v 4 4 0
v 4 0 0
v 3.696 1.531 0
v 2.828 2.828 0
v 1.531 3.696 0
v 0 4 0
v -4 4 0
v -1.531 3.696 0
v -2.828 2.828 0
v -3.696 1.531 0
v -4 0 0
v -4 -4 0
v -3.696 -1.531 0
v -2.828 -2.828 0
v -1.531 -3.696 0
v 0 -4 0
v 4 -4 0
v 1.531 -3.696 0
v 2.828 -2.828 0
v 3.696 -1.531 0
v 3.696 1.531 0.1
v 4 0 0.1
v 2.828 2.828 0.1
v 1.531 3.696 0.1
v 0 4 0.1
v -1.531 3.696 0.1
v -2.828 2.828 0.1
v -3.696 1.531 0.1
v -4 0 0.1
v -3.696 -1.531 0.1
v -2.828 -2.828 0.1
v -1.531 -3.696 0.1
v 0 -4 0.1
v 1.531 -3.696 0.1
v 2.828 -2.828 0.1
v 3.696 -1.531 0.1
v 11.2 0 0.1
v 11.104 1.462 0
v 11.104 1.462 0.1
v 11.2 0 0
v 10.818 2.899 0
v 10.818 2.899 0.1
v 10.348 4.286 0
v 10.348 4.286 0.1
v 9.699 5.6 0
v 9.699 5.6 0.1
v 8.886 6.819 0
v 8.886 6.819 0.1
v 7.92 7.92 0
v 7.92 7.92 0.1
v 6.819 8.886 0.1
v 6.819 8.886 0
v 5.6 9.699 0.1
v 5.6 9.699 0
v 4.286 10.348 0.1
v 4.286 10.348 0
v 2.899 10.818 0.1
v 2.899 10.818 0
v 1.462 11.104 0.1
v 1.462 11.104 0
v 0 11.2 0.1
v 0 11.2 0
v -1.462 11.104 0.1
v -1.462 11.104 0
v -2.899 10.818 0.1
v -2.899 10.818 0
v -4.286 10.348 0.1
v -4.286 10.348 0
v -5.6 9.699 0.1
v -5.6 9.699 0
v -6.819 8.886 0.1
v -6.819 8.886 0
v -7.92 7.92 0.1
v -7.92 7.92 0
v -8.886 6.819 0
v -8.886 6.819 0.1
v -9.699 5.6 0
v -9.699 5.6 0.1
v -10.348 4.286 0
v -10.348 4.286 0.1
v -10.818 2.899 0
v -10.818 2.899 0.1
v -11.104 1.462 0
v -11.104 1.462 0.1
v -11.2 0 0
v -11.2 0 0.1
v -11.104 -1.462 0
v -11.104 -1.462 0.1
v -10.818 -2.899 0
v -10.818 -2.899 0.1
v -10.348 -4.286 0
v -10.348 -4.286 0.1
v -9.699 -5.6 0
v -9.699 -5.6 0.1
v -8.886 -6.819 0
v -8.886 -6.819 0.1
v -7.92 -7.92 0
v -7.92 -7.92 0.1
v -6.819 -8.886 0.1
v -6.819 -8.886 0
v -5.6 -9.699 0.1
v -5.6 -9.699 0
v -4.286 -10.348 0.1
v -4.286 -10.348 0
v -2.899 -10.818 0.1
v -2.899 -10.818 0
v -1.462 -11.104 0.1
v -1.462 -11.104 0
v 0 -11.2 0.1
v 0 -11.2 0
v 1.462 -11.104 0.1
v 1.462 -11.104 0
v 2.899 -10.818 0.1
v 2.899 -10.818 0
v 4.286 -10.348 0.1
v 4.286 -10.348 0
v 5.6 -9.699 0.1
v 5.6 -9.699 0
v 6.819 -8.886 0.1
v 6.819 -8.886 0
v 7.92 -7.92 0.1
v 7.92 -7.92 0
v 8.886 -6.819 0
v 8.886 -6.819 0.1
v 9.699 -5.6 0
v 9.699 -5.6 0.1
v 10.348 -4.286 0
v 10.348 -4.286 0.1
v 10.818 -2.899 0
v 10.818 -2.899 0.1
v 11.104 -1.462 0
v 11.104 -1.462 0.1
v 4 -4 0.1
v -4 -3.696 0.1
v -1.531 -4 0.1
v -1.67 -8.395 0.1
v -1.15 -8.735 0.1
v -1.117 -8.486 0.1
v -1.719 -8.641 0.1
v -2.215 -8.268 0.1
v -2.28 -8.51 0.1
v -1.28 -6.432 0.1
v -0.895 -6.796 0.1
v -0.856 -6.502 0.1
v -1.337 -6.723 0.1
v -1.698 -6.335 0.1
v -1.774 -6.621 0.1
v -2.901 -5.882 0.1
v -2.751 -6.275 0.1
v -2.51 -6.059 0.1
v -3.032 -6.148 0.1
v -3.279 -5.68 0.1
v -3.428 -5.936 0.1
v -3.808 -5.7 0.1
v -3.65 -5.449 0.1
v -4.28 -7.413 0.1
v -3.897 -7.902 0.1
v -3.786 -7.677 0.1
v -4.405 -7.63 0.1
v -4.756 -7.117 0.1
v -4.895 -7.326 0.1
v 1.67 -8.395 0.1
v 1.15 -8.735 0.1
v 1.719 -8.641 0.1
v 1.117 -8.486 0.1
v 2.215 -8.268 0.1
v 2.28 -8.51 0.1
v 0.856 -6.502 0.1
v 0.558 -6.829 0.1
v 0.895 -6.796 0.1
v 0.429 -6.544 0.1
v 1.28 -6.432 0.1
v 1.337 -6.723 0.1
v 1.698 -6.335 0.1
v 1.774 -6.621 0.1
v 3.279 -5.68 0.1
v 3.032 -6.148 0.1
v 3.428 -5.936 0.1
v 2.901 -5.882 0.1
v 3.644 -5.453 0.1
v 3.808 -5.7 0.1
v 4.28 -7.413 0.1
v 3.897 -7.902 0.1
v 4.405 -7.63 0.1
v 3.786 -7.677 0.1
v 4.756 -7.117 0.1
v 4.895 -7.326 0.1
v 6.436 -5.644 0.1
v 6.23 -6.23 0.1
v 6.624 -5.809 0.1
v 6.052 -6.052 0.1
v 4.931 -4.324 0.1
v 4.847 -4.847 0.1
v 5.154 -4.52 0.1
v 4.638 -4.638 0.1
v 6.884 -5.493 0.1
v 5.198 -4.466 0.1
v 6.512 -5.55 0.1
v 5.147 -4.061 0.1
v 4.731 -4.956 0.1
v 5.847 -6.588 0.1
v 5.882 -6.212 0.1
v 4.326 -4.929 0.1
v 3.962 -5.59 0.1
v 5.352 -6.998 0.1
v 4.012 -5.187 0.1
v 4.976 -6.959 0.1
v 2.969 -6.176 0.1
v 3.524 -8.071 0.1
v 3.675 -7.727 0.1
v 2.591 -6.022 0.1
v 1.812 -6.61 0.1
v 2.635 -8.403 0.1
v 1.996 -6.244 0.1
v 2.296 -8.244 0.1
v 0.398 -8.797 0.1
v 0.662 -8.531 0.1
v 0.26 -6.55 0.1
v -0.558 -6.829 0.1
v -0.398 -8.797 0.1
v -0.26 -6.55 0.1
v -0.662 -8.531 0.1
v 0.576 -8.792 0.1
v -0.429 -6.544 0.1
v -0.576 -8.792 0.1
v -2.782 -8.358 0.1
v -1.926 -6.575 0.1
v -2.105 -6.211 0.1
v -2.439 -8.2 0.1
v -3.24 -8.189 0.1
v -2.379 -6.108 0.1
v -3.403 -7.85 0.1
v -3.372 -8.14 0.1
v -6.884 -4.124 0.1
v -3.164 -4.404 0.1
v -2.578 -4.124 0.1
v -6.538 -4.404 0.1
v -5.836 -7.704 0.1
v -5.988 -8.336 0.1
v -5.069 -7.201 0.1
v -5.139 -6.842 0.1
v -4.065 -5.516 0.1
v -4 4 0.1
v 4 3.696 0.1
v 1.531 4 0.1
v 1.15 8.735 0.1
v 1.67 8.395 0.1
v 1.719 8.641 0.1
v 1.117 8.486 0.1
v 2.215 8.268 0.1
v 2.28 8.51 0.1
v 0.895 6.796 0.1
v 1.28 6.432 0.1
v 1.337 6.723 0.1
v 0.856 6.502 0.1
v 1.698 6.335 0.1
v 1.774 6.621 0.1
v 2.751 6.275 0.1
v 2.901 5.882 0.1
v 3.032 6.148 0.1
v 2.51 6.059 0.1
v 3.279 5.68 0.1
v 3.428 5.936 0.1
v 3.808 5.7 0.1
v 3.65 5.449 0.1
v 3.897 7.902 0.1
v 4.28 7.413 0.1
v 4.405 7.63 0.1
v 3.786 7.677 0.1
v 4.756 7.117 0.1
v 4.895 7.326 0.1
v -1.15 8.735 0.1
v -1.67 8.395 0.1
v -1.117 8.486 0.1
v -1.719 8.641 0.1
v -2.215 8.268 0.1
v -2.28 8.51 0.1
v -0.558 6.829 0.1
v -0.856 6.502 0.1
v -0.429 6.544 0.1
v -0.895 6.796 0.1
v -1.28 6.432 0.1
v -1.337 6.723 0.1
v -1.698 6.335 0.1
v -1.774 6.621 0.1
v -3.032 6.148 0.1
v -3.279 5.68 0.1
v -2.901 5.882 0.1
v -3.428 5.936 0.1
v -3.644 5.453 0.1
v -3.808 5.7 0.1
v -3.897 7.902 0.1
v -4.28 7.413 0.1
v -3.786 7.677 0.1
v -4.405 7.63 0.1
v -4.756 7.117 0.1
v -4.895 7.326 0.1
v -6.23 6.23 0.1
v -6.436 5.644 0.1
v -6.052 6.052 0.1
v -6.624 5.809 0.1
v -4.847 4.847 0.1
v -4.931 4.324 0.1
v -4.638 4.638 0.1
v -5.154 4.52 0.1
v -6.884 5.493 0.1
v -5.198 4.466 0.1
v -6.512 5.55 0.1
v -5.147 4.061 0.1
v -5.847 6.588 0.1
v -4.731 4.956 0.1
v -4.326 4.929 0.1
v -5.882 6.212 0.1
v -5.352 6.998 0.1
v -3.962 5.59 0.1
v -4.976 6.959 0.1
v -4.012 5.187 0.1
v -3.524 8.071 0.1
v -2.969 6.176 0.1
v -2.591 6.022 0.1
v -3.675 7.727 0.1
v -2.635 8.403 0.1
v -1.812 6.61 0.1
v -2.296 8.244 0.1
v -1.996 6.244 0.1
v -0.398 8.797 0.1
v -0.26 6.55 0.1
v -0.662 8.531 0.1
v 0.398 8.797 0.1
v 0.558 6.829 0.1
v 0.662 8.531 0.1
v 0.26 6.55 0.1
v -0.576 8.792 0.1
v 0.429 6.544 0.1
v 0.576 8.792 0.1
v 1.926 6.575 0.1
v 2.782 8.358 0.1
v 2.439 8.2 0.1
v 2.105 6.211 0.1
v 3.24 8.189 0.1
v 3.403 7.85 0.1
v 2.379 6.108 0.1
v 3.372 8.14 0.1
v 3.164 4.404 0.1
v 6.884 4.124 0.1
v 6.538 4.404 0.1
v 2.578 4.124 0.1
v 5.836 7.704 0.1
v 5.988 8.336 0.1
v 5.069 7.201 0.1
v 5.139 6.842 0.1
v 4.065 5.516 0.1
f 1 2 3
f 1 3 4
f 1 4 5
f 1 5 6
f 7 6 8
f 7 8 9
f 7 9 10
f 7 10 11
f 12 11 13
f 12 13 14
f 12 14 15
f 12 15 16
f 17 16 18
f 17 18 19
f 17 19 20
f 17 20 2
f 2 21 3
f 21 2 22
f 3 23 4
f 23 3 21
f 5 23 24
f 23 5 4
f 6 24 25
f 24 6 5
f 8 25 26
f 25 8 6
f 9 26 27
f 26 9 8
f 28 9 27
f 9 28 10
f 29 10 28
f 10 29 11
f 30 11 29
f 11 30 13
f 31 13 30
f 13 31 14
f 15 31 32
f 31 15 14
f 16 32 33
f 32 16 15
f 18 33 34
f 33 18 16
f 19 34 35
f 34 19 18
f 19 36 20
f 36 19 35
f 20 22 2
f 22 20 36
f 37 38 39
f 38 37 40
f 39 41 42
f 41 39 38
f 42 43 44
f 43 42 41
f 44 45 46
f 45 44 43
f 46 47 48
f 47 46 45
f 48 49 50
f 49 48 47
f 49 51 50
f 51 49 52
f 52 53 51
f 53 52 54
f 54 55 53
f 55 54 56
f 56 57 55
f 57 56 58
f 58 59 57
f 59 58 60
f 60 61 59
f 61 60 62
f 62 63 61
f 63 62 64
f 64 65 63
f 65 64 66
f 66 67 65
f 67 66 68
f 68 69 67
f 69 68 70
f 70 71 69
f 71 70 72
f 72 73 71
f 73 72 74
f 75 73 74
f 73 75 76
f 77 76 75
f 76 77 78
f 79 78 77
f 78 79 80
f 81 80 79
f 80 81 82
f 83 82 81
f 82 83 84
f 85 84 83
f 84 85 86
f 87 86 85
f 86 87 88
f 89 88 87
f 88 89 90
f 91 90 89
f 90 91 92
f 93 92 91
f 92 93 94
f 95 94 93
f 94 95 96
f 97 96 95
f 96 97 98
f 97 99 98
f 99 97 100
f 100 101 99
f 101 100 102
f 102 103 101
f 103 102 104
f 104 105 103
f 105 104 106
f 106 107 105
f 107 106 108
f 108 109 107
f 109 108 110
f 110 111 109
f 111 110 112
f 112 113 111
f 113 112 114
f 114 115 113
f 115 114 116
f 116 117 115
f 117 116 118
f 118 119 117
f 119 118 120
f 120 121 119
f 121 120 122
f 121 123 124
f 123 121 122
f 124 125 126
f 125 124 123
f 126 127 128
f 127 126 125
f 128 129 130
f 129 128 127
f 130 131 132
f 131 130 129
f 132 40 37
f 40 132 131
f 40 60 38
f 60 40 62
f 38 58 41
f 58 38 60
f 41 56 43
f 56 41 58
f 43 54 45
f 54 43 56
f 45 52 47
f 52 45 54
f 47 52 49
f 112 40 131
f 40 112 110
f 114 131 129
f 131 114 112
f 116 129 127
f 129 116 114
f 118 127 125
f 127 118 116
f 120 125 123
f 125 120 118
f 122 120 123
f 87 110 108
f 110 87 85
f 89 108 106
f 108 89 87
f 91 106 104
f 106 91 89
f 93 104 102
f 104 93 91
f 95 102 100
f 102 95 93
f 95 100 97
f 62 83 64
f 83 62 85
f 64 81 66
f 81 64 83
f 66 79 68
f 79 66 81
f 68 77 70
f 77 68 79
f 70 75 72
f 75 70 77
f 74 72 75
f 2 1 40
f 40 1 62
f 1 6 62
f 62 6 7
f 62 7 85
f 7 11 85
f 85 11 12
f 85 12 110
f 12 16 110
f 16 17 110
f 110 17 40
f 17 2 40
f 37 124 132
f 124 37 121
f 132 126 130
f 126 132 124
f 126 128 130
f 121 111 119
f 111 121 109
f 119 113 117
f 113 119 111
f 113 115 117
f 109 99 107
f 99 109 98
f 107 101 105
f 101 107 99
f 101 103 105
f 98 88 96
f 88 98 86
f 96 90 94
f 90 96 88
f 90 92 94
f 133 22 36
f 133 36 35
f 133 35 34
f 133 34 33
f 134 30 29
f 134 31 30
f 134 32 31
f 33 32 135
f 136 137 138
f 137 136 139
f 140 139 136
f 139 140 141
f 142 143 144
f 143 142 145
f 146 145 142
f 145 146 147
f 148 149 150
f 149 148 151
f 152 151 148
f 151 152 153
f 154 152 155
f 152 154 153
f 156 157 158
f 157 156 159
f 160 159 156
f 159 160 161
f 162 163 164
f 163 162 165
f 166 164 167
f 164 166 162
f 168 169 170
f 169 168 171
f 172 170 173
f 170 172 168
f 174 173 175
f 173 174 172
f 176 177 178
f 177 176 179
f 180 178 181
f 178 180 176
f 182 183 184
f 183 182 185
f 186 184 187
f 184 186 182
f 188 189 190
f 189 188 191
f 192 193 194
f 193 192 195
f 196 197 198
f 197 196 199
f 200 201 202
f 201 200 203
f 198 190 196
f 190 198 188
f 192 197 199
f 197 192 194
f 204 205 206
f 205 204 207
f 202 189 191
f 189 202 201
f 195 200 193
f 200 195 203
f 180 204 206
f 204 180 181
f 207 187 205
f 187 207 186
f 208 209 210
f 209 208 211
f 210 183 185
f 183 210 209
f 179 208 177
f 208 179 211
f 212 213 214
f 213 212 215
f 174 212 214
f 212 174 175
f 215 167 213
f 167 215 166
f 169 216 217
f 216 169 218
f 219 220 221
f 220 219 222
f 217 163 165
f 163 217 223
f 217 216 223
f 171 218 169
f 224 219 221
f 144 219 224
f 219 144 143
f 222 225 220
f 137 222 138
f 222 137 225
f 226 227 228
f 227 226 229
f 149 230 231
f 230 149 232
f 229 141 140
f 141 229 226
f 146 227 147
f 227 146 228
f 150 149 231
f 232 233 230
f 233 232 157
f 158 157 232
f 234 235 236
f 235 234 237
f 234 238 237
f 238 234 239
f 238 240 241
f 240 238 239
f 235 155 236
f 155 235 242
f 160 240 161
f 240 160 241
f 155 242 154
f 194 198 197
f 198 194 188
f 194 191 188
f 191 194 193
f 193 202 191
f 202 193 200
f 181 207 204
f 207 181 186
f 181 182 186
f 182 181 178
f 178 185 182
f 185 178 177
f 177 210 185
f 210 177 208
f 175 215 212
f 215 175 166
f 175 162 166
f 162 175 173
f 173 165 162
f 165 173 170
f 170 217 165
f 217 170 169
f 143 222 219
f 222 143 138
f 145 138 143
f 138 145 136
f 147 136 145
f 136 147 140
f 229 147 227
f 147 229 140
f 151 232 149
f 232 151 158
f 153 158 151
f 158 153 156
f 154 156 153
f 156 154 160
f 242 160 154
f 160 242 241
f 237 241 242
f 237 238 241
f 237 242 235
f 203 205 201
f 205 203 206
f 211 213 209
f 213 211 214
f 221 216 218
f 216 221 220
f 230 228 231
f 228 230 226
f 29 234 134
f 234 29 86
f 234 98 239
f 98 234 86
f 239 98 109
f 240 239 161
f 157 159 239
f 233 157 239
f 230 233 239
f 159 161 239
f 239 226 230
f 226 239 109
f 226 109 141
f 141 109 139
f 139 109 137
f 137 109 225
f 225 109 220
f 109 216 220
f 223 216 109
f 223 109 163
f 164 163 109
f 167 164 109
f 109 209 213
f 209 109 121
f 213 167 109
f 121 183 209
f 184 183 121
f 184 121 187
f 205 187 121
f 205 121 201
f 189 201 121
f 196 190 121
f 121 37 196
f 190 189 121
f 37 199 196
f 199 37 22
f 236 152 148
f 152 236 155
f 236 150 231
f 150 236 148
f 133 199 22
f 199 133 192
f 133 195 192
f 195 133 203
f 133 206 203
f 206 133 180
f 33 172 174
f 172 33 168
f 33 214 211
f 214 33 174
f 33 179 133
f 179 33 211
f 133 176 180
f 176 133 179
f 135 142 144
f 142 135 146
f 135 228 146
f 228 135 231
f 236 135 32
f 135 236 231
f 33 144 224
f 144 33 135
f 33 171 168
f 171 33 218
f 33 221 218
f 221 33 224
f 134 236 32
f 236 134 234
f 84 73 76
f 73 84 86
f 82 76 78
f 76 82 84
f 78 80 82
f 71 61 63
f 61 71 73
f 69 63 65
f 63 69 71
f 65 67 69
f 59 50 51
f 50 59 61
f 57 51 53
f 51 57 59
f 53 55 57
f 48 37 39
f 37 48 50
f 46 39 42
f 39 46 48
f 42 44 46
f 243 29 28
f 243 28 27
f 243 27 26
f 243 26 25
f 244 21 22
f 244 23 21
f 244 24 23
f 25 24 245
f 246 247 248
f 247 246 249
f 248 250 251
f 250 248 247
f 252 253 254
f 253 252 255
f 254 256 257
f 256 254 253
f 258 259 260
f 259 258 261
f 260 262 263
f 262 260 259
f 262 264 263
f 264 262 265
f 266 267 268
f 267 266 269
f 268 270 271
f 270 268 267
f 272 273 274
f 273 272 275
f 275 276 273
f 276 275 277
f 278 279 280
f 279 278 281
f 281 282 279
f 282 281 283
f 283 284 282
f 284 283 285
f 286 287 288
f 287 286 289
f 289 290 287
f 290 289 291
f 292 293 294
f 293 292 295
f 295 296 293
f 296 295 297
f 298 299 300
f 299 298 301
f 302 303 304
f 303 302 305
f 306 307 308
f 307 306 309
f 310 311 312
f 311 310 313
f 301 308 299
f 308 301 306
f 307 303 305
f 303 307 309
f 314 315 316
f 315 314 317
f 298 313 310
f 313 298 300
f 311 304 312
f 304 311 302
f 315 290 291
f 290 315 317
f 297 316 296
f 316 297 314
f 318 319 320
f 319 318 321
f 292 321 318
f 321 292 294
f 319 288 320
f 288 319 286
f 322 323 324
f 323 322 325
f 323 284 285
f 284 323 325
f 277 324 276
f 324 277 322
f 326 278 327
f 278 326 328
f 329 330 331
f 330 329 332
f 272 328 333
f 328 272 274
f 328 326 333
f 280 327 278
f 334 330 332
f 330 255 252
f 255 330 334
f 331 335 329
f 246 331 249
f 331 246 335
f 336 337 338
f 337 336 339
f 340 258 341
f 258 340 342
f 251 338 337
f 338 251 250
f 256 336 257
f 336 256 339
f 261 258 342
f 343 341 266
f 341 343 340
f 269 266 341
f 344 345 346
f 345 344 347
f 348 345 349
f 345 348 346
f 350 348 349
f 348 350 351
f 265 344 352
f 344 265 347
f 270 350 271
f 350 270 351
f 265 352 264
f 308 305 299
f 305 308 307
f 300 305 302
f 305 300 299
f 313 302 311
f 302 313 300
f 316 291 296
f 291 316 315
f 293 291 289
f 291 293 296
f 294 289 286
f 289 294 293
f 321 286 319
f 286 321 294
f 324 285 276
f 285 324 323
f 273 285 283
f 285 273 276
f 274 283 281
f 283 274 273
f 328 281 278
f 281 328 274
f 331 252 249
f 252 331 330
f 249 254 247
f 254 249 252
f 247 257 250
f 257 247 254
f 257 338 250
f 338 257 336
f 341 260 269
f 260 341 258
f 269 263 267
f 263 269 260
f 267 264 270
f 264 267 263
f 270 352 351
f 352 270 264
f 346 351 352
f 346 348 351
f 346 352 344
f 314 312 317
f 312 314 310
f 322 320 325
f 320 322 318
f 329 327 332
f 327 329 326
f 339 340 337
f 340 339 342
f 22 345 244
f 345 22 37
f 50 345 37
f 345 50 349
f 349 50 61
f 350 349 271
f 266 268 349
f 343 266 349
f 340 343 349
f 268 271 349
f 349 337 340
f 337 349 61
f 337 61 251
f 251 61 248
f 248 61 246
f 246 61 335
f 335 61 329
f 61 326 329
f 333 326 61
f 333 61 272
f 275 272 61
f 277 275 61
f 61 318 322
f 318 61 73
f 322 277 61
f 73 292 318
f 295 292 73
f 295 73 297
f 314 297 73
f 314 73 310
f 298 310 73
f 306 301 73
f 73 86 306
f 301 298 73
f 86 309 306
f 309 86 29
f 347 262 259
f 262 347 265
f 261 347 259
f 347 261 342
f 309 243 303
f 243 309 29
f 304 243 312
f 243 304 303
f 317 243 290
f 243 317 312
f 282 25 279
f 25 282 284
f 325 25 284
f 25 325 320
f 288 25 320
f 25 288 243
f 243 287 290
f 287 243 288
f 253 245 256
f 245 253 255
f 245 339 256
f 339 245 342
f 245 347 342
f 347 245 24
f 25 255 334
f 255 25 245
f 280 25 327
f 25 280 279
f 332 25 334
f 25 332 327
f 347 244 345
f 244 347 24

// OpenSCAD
// file: ../p/48/1-4cyli.scad
use <../../lib.scad>
function ldraw_lib__48__1_4cyli() = [
// 0 Hi-Res Cylinder 0.25
// 0 Name: 48\1-4cyli.dat
// 0 Author: Magnus Forsberg [MagFors]
// 0 !LDRAW_ORG 48_Primitive UPDATE 2024-01
// 0 !LICENSE Licensed under CC BY 4.0 : see CAreadme.txt
// 
// 0 BFC CERTIFY CCW
  [0,"BFC","CERTIFY"],
  [0,"BFC","CCW"],
// 
// 0 !HISTORY 1999-07-05 [PTadmin] Official Update 1999-05
// 0 !HISTORY 2002-02-28 [hafhead] Added BFC statement
// 0 !HISTORY 2002-04-25 [PTadmin] Official Update 2002-02
// 0 !HISTORY 2007-06-24 [PTadmin] Header formatted for Contributor Agreement
// 0 !HISTORY 2008-07-01 [PTadmin] Official Update 2008-01
// 0 !HISTORY 2008-07-07 [guyvivan] Made BFC'ed CCW (2005-12-06)
// 0 !HISTORY 2009-05-02 [PTadmin] Official Update 2009-01
// 0 !HISTORY 2024-01-03 [MagFors] Complete regeneration, original by Manfred Moolhuysen
// 0 !HISTORY 2024-01-29 [OrionP] Official Update 2024-01
// 
// 4 16 0.9914 0 0.1305 1 0 0 1 1 0 0.9914 1 0.1305
  [4,16,0.9914,0,0.1305,1,0,0,1,1,0,0.9914,1,0.1305],
// 4 16 0.9659 0 0.2588 0.9914 0 0.1305 0.9914 1 0.1305 0.9659 1 0.2588
  [4,16,0.9659,0,0.2588,0.9914,0,0.1305,0.9914,1,0.1305,0.9659,1,0.2588],
// 4 16 0.9239 0 0.3827 0.9659 0 0.2588 0.9659 1 0.2588 0.9239 1 0.3827
  [4,16,0.9239,0,0.3827,0.9659,0,0.2588,0.9659,1,0.2588,0.9239,1,0.3827],
// 4 16 0.866 0 0.5 0.9239 0 0.3827 0.9239 1 0.3827 0.866 1 0.5
  [4,16,0.866,0,0.5,0.9239,0,0.3827,0.9239,1,0.3827,0.866,1,0.5],
// 4 16 0.7934 0 0.6088 0.866 0 0.5 0.866 1 0.5 0.7934 1 0.6088
  [4,16,0.7934,0,0.6088,0.866,0,0.5,0.866,1,0.5,0.7934,1,0.6088],
// 4 16 0.7071 0 0.7071 0.7934 0 0.6088 0.7934 1 0.6088 0.7071 1 0.7071
  [4,16,0.7071,0,0.7071,0.7934,0,0.6088,0.7934,1,0.6088,0.7071,1,0.7071],
// 4 16 0.6088 0 0.7934 0.7071 0 0.7071 0.7071 1 0.7071 0.6088 1 0.7934
  [4,16,0.6088,0,0.7934,0.7071,0,0.7071,0.7071,1,0.7071,0.6088,1,0.7934],
// 4 16 0.5 0 0.866 0.6088 0 0.7934 0.6088 1 0.7934 0.5 1 0.866
  [4,16,0.5,0,0.866,0.6088,0,0.7934,0.6088,1,0.7934,0.5,1,0.866],
// 4 16 0.3827 0 0.9239 0.5 0 0.866 0.5 1 0.866 0.3827 1 0.9239
  [4,16,0.3827,0,0.9239,0.5,0,0.866,0.5,1,0.866,0.3827,1,0.9239],
// 4 16 0.2588 0 0.9659 0.3827 0 0.9239 0.3827 1 0.9239 0.2588 1 0.9659
  [4,16,0.2588,0,0.9659,0.3827,0,0.9239,0.3827,1,0.9239,0.2588,1,0.9659],
// 4 16 0.1305 0 0.9914 0.2588 0 0.9659 0.2588 1 0.9659 0.1305 1 0.9914
  [4,16,0.1305,0,0.9914,0.2588,0,0.9659,0.2588,1,0.9659,0.1305,1,0.9914],
// 4 16 0 0 1 0.1305 0 0.9914 0.1305 1 0.9914 0 1 1
  [4,16,0,0,1,0.1305,0,0.9914,0.1305,1,0.9914,0,1,1],
// 0 // conditional lines
// 5 24 1 1 0 1 0 0 1 1 -0.1317 0.9914 1 0.1305
  [5,24,1,1,0,1,0,0,1,1,-0.1317,0.9914,1,0.1305],
// 5 24 0.9914 1 0.1305 0.9914 0 0.1305 1 1 0 0.9659 1 0.2588
  [5,24,0.9914,1,0.1305,0.9914,0,0.1305,1,1,0,0.9659,1,0.2588],
// 5 24 0.9659 1 0.2588 0.9659 0 0.2588 0.9914 1 0.1305 0.9239 1 0.3827
  [5,24,0.9659,1,0.2588,0.9659,0,0.2588,0.9914,1,0.1305,0.9239,1,0.3827],
// 5 24 0.9239 1 0.3827 0.9239 0 0.3827 0.9659 1 0.2588 0.866 1 0.5
  [5,24,0.9239,1,0.3827,0.9239,0,0.3827,0.9659,1,0.2588,0.866,1,0.5],
// 5 24 0.866 1 0.5 0.866 0 0.5 0.9239 1 0.3827 0.7934 1 0.6088
  [5,24,0.866,1,0.5,0.866,0,0.5,0.9239,1,0.3827,0.7934,1,0.6088],
// 5 24 0.7934 1 0.6088 0.7934 0 0.6088 0.866 1 0.5 0.7071 1 0.7071
  [5,24,0.7934,1,0.6088,0.7934,0,0.6088,0.866,1,0.5,0.7071,1,0.7071],
// 5 24 0.7071 1 0.7071 0.7071 0 0.7071 0.7934 1 0.6088 0.6088 1 0.7934
  [5,24,0.7071,1,0.7071,0.7071,0,0.7071,0.7934,1,0.6088,0.6088,1,0.7934],
// 5 24 0.6088 1 0.7934 0.6088 0 0.7934 0.7071 1 0.7071 0.5 1 0.866
  [5,24,0.6088,1,0.7934,0.6088,0,0.7934,0.7071,1,0.7071,0.5,1,0.866],
// 5 24 0.5 1 0.866 0.5 0 0.866 0.6088 1 0.7934 0.3827 1 0.9239
  [5,24,0.5,1,0.866,0.5,0,0.866,0.6088,1,0.7934,0.3827,1,0.9239],
// 5 24 0.3827 1 0.9239 0.3827 0 0.9239 0.5 1 0.866 0.2588 1 0.9659
  [5,24,0.3827,1,0.9239,0.3827,0,0.9239,0.5,1,0.866,0.2588,1,0.9659],
// 5 24 0.2588 1 0.9659 0.2588 0 0.9659 0.3827 1 0.9239 0.1305 1 0.9914
  [5,24,0.2588,1,0.9659,0.2588,0,0.9659,0.3827,1,0.9239,0.1305,1,0.9914],
// 5 24 0.1305 1 0.9914 0.1305 0 0.9914 0.2588 1 0.9659 0 1 1
  [5,24,0.1305,1,0.9914,0.1305,0,0.9914,0.2588,1,0.9659,0,1,1],
// 5 24 0 1 1 0 0 1 0.1305 1 0.9914 -0.1317 1 1
  [5,24,0,1,1,0,0,1,0.1305,1,0.9914,-0.1317,1,1],
// 0 // Build by LDPartEditor (PrimGen 2.X)
];
module ldraw_lib__48__1_4cyli(step=0, col=false, unit=2/5, alt=false, line=0.2, solid=!$preview)
    makepoly(ldraw_lib__48__1_4cyli(), step=step, col=col, unit=unit, alt=alt, line=line, solid=solid);
ldraw_lib__48__1_4cyli(line=0.2);
// file: ../p/48/4-4cyli.scad
use <../../lib.scad>
use <1-4cyli.scad>
function ldraw_lib__48__4_4cyli() = [
// 0 Hi-Res Cylinder 1.0
// 0 Name: 48\4-4cyli.dat
// 0 Author: Paul Easter [pneaster]
// 0 !LDRAW_ORG 48_Primitive UPDATE 2012-02
// 0 !LICENSE Licensed under CC BY 4.0 : see CAreadme.txt
// 
// 0 BFC CERTIFY CCW
  [0,"BFC","CERTIFY"],
  [0,"BFC","CCW"],
// 
// 0 !HISTORY 2002-08-18 [PTadmin] Official Update 2002-04
// 0 !HISTORY 2007-06-24 [PTadmin] Header formatted for Contributor Agreement
// 0 !HISTORY 2008-07-01 [PTadmin] Official Update 2008-01
// 0 !HISTORY 2012-02-27 [Philo] Changed to CCW
// 0 !HISTORY 2012-08-09 [PTadmin] Official Update 2012-02
// 
// 
// 1 16 0 0 0 1 0 0 0 1 0 0 0 1 48\1-4cyli.dat
  [1,16,0,0,0,1,0,0,0,1,0,0,0,1, ldraw_lib__48__1_4cyli()],
// 1 16 0 0 0 0 0 -1 0 1 0 1 0 0 48\1-4cyli.dat
  [1,16,0,0,0,0,0,-1,0,1,0,1,0,0, ldraw_lib__48__1_4cyli()],
// 1 16 0 0 0 -1 0 0 0 1 0 0 0 -1 48\1-4cyli.dat
  [1,16,0,0,0,-1,0,0,0,1,0,0,0,-1, ldraw_lib__48__1_4cyli()],
// 1 16 0 0 0 0 0 1 0 1 0 -1 0 0 48\1-4cyli.dat
  [1,16,0,0,0,0,0,1,0,1,0,-1,0,0, ldraw_lib__48__1_4cyli()],
];
module ldraw_lib__48__4_4cyli(step=0, col=false, unit=2/5, alt=false, line=0.2, solid=!$preview)
    makepoly(ldraw_lib__48__4_4cyli(), step=step, col=col, unit=unit, alt=alt, line=line, solid=solid);
ldraw_lib__48__4_4cyli(line=0.2);
// file: ../p/48/1-4chrd.scad
use <../../lib.scad>
function ldraw_lib__48__1_4chrd() = [
// 0 Hi-Res Chord 0.25
// 0 Name: 48\1-4chrd.dat
// 0 Author: Willy Tschager [Holly-Wood]
// 0 !LDRAW_ORG 48_Primitive UPDATE 2024-01
// 0 !LICENSE Licensed under CC BY 4.0 : see CAreadme.txt
// 
// 0 BFC CERTIFY CCW
  [0,"BFC","CERTIFY"],
  [0,"BFC","CCW"],
// 
// 0 !HISTORY 2009-05-02 [PTadmin] Official Update 2009-01
// 0 !HISTORY 2012-08-02 [MMR1988] Re-creation with PrimGen2 and Rectifier
// 0 !HISTORY 2012-08-09 [PTadmin] Official Update 2012-02
// 0 !HISTORY 2024-01-04 [Holly-Wood] Complete re-write, original by westrate
// 0 !HISTORY 2024-01-29 [OrionP] Official Update 2024-01
// 
// 0 // Vertices calculated by LDPartEditor (PrimGen 2.X)
// 
// 4 16 0 0 1 1 0 0 .9914 0 .1305 .1305 0 .9914
  [4,16,0,0,1,1,0,0,.9914,0,.1305,.1305,0,.9914],
// 4 16 .1305 0 .9914 .9914 0 .1305 .9659 0 .2588 .2588 0 .9659
  [4,16,.1305,0,.9914,.9914,0,.1305,.9659,0,.2588,.2588,0,.9659],
// 4 16 .2588 0 .9659 .9659 0 .2588 .9239 0 .3827 .3827 0 .9239
  [4,16,.2588,0,.9659,.9659,0,.2588,.9239,0,.3827,.3827,0,.9239],
// 4 16 .3827 0 .9239 .9239 0 .3827 .866 0 .5 .5 0 .866
  [4,16,.3827,0,.9239,.9239,0,.3827,.866,0,.5,.5,0,.866],
// 4 16 .5 0 .866 .866 0 .5 .7934 0 .6088 .6088 0 .7934
  [4,16,.5,0,.866,.866,0,.5,.7934,0,.6088,.6088,0,.7934],
// 3 16 .6088 0 .7934 .7934 0 .6088 .7071 0 .7071
  [3,16,.6088,0,.7934,.7934,0,.6088,.7071,0,.7071],
];
module ldraw_lib__48__1_4chrd(step=0, col=false, unit=2/5, alt=false, line=0.2, solid=!$preview)
    makepoly(ldraw_lib__48__1_4chrd(), step=step, col=col, unit=unit, alt=alt, line=line, solid=solid);
ldraw_lib__48__1_4chrd(line=0.2);
// file: ../p/4-4ndis.scad
use <../lib.scad>
function ldraw_lib__4_4ndis() = [
// 0 Disc Negative 1.0
// 0 Name: 4-4ndis.dat
// 0 Author: James Jessiman
// 0 !LDRAW_ORG Primitive UPDATE 2012-01
// 0 !LICENSE Licensed under CC BY 4.0 : see CAreadme.txt
// 
// 0 BFC CERTIFY CCW
  [0,"BFC","CERTIFY"],
  [0,"BFC","CCW"],
// 
// 0 !HISTORY 2002-03-23 [sbliss] Added BFC statement; compacted code
// 0 !HISTORY 2002-04-25 [PTadmin] Official Update 2002-02
// 0 !HISTORY 2007-06-24 [PTadmin] Header formatted for Contributor Agreement
// 0 !HISTORY 2008-07-01 [PTadmin] Official Update 2008-01
// 0 !HISTORY 2012-02-16 [Philo] Changed to CCW
// 0 !HISTORY 2012-03-30 [PTadmin] Official Update 2012-01
// 
// 
// 3 16 0.9239 0 0.3827 1 0 0 1 0 1
  [3,16,0.9239,0,0.3827,1,0,0,1,0,1],
// 3 16 0.7071 0 0.7071 0.9239 0 0.3827 1 0 1
  [3,16,0.7071,0,0.7071,0.9239,0,0.3827,1,0,1],
// 3 16 0.3827 0 0.9239 0.7071 0 0.7071 1 0 1
  [3,16,0.3827,0,0.9239,0.7071,0,0.7071,1,0,1],
// 3 16 0 0 1 0.3827 0 0.9239 1 0 1
  [3,16,0,0,1,0.3827,0,0.9239,1,0,1],
// 3 16 -0.3827 0 0.9239 0 0 1 -1 0 1
  [3,16,-0.3827,0,0.9239,0,0,1,-1,0,1],
// 3 16 -0.7071 0 0.7071 -0.3827 0 0.9239 -1 0 1
  [3,16,-0.7071,0,0.7071,-0.3827,0,0.9239,-1,0,1],
// 3 16 -0.9239 0 0.3827 -0.7071 0 0.7071 -1 0 1
  [3,16,-0.9239,0,0.3827,-0.7071,0,0.7071,-1,0,1],
// 3 16 -1 0 0 -0.9239 0 0.3827 -1 0 1
  [3,16,-1,0,0,-0.9239,0,0.3827,-1,0,1],
// 3 16 -0.9239 0 -0.3827 -1 0 0 -1 0 -1
  [3,16,-0.9239,0,-0.3827,-1,0,0,-1,0,-1],
// 3 16 -0.7071 0 -0.7071 -0.9239 0 -0.3827 -1 0 -1
  [3,16,-0.7071,0,-0.7071,-0.9239,0,-0.3827,-1,0,-1],
// 3 16 -0.3827 0 -0.9239 -0.7071 0 -0.7071 -1 0 -1
  [3,16,-0.3827,0,-0.9239,-0.7071,0,-0.7071,-1,0,-1],
// 3 16 0 0 -1 -0.3827 0 -0.9239 -1 0 -1
  [3,16,0,0,-1,-0.3827,0,-0.9239,-1,0,-1],
// 3 16 0.3827 0 -0.9239 0 0 -1 1 0 -1
  [3,16,0.3827,0,-0.9239,0,0,-1,1,0,-1],
// 3 16 0.7071 0 -0.7071 0.3827 0 -0.9239 1 0 -1
  [3,16,0.7071,0,-0.7071,0.3827,0,-0.9239,1,0,-1],
// 3 16 0.9239 0 -0.3827 0.7071 0 -0.7071 1 0 -1
  [3,16,0.9239,0,-0.3827,0.7071,0,-0.7071,1,0,-1],
// 3 16 1 0 0 0.9239 0 -0.3827 1 0 -1
  [3,16,1,0,0,0.9239,0,-0.3827,1,0,-1],
];
module ldraw_lib__4_4ndis(step=0, col=false, unit=2/5, alt=false, line=0.2, solid=!$preview)
    makepoly(ldraw_lib__4_4ndis(), step=step, col=col, unit=unit, alt=alt, line=line, solid=solid);
ldraw_lib__4_4ndis(line=0.2);
// file: ../p/4-4cyli.scad
use <../lib.scad>
function ldraw_lib__4_4cyli() = [
// 0 Cylinder 1.0
// 0 Name: 4-4cyli.dat
// 0 Author: James Jessiman
// 0 !LDRAW_ORG Primitive UPDATE 2005-01
// 0 !LICENSE Licensed under CC BY 4.0 : see CAreadme.txt
// 
// 0 BFC CERTIFY CCW
  [0,"BFC","CERTIFY"],
  [0,"BFC","CCW"],
// 
// 0 !HISTORY 1998-12-15 [PTadmin] Official Update 1998-10
// 0 !HISTORY 2002-03-23 [sbliss] Added BFC statement; merged headers from files in distributions LDraw 0.27 and Complete.
// 0 !HISTORY 2002-04-25 [PTadmin] Official Update 2002-02
// 0 !HISTORY 2004-12-14 [guyvivan] BFC CCW
// 0 !HISTORY 2005-12-28 [PTadmin] Official Update 2005-01
// 0 !HISTORY 2007-06-24 [PTadmin] Header formatted for Contributor Agreement
// 0 !HISTORY 2008-07-01 [PTadmin] Official Update 2008-01
// 
// 
// 4 16 1 1 0 0.9239 1 0.3827 0.9239 0 0.3827 1 0 0
  [4,16,1,1,0,0.9239,1,0.3827,0.9239,0,0.3827,1,0,0],
// 5 24 1 0 0 1 1 0 0.9239 0 0.3827 0.9239 0 -0.3827
  [5,24,1,0,0,1,1,0,0.9239,0,0.3827,0.9239,0,-0.3827],
// 4 16 0.9239 1 0.3827 0.7071 1 0.7071 0.7071 0 0.7071 0.9239 0 0.3827
  [4,16,0.9239,1,0.3827,0.7071,1,0.7071,0.7071,0,0.7071,0.9239,0,0.3827],
// 5 24 0.9239 0 0.3827 0.9239 1 0.3827 0.7071 0 0.7071 1 0 0
  [5,24,0.9239,0,0.3827,0.9239,1,0.3827,0.7071,0,0.7071,1,0,0],
// 4 16 0.7071 1 0.7071 0.3827 1 0.9239 0.3827 0 0.9239 0.7071 0 0.7071
  [4,16,0.7071,1,0.7071,0.3827,1,0.9239,0.3827,0,0.9239,0.7071,0,0.7071],
// 5 24 0.7071 0 0.7071 0.7071 1 0.7071 0.3827 0 0.9239 0.9239 0 0.3827
  [5,24,0.7071,0,0.7071,0.7071,1,0.7071,0.3827,0,0.9239,0.9239,0,0.3827],
// 4 16 0.3827 1 0.9239 0 1 1 0 0 1 0.3827 0 0.9239
  [4,16,0.3827,1,0.9239,0,1,1,0,0,1,0.3827,0,0.9239],
// 5 24 0.3827 0 0.9239 0.3827 1 0.9239 0 0 1 0.7071 0 0.7071
  [5,24,0.3827,0,0.9239,0.3827,1,0.9239,0,0,1,0.7071,0,0.7071],
// 4 16 0 1 1 -0.3827 1 0.9239 -0.3827 0 0.9239 0 0 1
  [4,16,0,1,1,-0.3827,1,0.9239,-0.3827,0,0.9239,0,0,1],
// 5 24 0 0 1 0 1 1 -0.3827 0 0.9239 0.3827 0 0.9239
  [5,24,0,0,1,0,1,1,-0.3827,0,0.9239,0.3827,0,0.9239],
// 4 16 -0.3827 1 0.9239 -0.7071 1 0.7071 -0.7071 0 0.7071 -0.3827 0 0.9239
  [4,16,-0.3827,1,0.9239,-0.7071,1,0.7071,-0.7071,0,0.7071,-0.3827,0,0.9239],
// 5 24 -0.3827 0 0.9239 -0.3827 1 0.9239 -0.7071 0 0.7071 0 0 1
  [5,24,-0.3827,0,0.9239,-0.3827,1,0.9239,-0.7071,0,0.7071,0,0,1],
// 4 16 -0.7071 1 0.7071 -0.9239 1 0.3827 -0.9239 0 0.3827 -0.7071 0 0.7071
  [4,16,-0.7071,1,0.7071,-0.9239,1,0.3827,-0.9239,0,0.3827,-0.7071,0,0.7071],
// 5 24 -0.7071 0 0.7071 -0.7071 1 0.7071 -0.9239 0 0.3827 -0.3827 0 0.9239
  [5,24,-0.7071,0,0.7071,-0.7071,1,0.7071,-0.9239,0,0.3827,-0.3827,0,0.9239],
// 4 16 -0.9239 1 0.3827 -1 1 0 -1 0 0 -0.9239 0 0.3827
  [4,16,-0.9239,1,0.3827,-1,1,0,-1,0,0,-0.9239,0,0.3827],
// 5 24 -0.9239 0 0.3827 -0.9239 1 0.3827 -1 0 0 -0.7071 0 0.7071
  [5,24,-0.9239,0,0.3827,-0.9239,1,0.3827,-1,0,0,-0.7071,0,0.7071],
// 4 16 -1 1 0 -0.9239 1 -0.3827 -0.9239 0 -0.3827 -1 0 0
  [4,16,-1,1,0,-0.9239,1,-0.3827,-0.9239,0,-0.3827,-1,0,0],
// 5 24 -1 0 0 -1 1 0 -0.9239 0 -0.3827 -0.9239 0 0.3827
  [5,24,-1,0,0,-1,1,0,-0.9239,0,-0.3827,-0.9239,0,0.3827],
// 4 16 -0.9239 1 -0.3827 -0.7071 1 -0.7071 -0.7071 0 -0.7071 -0.9239 0 -0.3827
  [4,16,-0.9239,1,-0.3827,-0.7071,1,-0.7071,-0.7071,0,-0.7071,-0.9239,0,-0.3827],
// 5 24 -0.9239 0 -0.3827 -0.9239 1 -0.3827 -0.7071 0 -0.7071 -1 0 0
  [5,24,-0.9239,0,-0.3827,-0.9239,1,-0.3827,-0.7071,0,-0.7071,-1,0,0],
// 4 16 -0.7071 1 -0.7071 -0.3827 1 -0.9239 -0.3827 0 -0.9239 -0.7071 0 -0.7071
  [4,16,-0.7071,1,-0.7071,-0.3827,1,-0.9239,-0.3827,0,-0.9239,-0.7071,0,-0.7071],
// 5 24 -0.7071 0 -0.7071 -0.7071 1 -0.7071 -0.3827 0 -0.9239 -0.9239 0 -0.3827
  [5,24,-0.7071,0,-0.7071,-0.7071,1,-0.7071,-0.3827,0,-0.9239,-0.9239,0,-0.3827],
// 4 16 -0.3827 1 -0.9239 0 1 -1 0 0 -1 -0.3827 0 -0.9239
  [4,16,-0.3827,1,-0.9239,0,1,-1,0,0,-1,-0.3827,0,-0.9239],
// 5 24 -0.3827 0 -0.9239 -0.3827 1 -0.9239 0 0 -1 -0.7071 0 -0.7071
  [5,24,-0.3827,0,-0.9239,-0.3827,1,-0.9239,0,0,-1,-0.7071,0,-0.7071],
// 4 16 0 1 -1 0.3827 1 -0.9239 0.3827 0 -0.9239 0 0 -1
  [4,16,0,1,-1,0.3827,1,-0.9239,0.3827,0,-0.9239,0,0,-1],
// 5 24 0 0 -1 0 1 -1 0.3827 0 -0.9239 -0.3827 0 -0.9239
  [5,24,0,0,-1,0,1,-1,0.3827,0,-0.9239,-0.3827,0,-0.9239],
// 4 16 0.3827 1 -0.9239 0.7071 1 -0.7071 0.7071 0 -0.7071 0.3827 0 -0.9239
  [4,16,0.3827,1,-0.9239,0.7071,1,-0.7071,0.7071,0,-0.7071,0.3827,0,-0.9239],
// 5 24 0.3827 0 -0.9239 0.3827 1 -0.9239 0.7071 0 -0.7071 0 0 -1
  [5,24,0.3827,0,-0.9239,0.3827,1,-0.9239,0.7071,0,-0.7071,0,0,-1],
// 4 16 0.7071 1 -0.7071 0.9239 1 -0.3827 0.9239 0 -0.3827 0.7071 0 -0.7071
  [4,16,0.7071,1,-0.7071,0.9239,1,-0.3827,0.9239,0,-0.3827,0.7071,0,-0.7071],
// 5 24 0.7071 0 -0.7071 0.7071 1 -0.7071 0.9239 0 -0.3827 0.3827 0 -0.9239
  [5,24,0.7071,0,-0.7071,0.7071,1,-0.7071,0.9239,0,-0.3827,0.3827,0,-0.9239],
// 4 16 0.9239 1 -0.3827 1 1 0 1 0 0 0.9239 0 -0.3827
  [4,16,0.9239,1,-0.3827,1,1,0,1,0,0,0.9239,0,-0.3827],
// 5 24 0.9239 0 -0.3827 0.9239 1 -0.3827 1 0 0 0.7071 0 -0.7071
  [5,24,0.9239,0,-0.3827,0.9239,1,-0.3827,1,0,0,0.7071,0,-0.7071],
// 0
];
module ldraw_lib__4_4cyli(step=0, col=false, unit=2/5, alt=false, line=0.2, solid=!$preview)
    makepoly(ldraw_lib__4_4cyli(), step=step, col=col, unit=unit, alt=alt, line=line, solid=solid);
ldraw_lib__4_4cyli(line=0.2);
// file: ../p/48/1-8chrd.scad
use <../../lib.scad>
function ldraw_lib__48__1_8chrd() = [
// 0 Hi-Res Chord 0.125
// 0 Name: 48\1-8chrd.dat
// 0 Author: Willy Tschager [Holly-Wood]
// 0 !LDRAW_ORG 48_Primitive UPDATE 2024-01
// 0 !LICENSE Licensed under CC BY 4.0 : see CAreadme.txt
// 
// 0 BFC CERTIFY CCW
  [0,"BFC","CERTIFY"],
  [0,"BFC","CCW"],
// 
// 0 !HISTORY 2009-05-02 [PTadmin] Official Update 2009-01
// 0 !HISTORY 2024-01-04 [Holly-Wood] Complete re-write, original by guyvivan
// 0 !HISTORY 2024-01-29 [OrionP] Official Update 2024-01
// 
// 0 // Vertices calculated by LDPartEditor (PrimGen 2.X)
// 
// 4 16 .7071 0 .7071 1 0 0 .9914 0 .1305 .7934 0 .6088
  [4,16,.7071,0,.7071,1,0,0,.9914,0,.1305,.7934,0,.6088],
// 4 16 .7934 0 .6088 .9914 0 .1305 .9659 0 .2588 .866 0 .5
  [4,16,.7934,0,.6088,.9914,0,.1305,.9659,0,.2588,.866,0,.5],
// 3 16 .866 0 .5 .9659 0 .2588 .9239 0 .3827
  [3,16,.866,0,.5,.9659,0,.2588,.9239,0,.3827],
];
module ldraw_lib__48__1_8chrd(step=0, col=false, unit=2/5, alt=false, line=0.2, solid=!$preview)
    makepoly(ldraw_lib__48__1_8chrd(), step=step, col=col, unit=unit, alt=alt, line=line, solid=solid);
ldraw_lib__48__1_8chrd(line=0.2);
// file: ../p/3-16tndis.scad
use <../lib.scad>
function ldraw_lib__3_16tndis() = [
// 0 Disc Negative Truncated 0.1875
// 0 Name: 3-16tndis.dat
// 0 Author: Massimo Maso [Sirio]
// 0 !LDRAW_ORG Primitive UPDATE 2022-02
// 0 !LICENSE Licensed under CC BY 4.0 : see CAreadme.txt
// 
// 0 BFC CERTIFY CCW
  [0,"BFC","CERTIFY"],
  [0,"BFC","CCW"],
// 
// 0 !HISTORY 2022-03-06 [PTadmin] Official Update 2022-02
// 
// 
// 3 16 1 0 .9239 .9239 0 .3827 1 0 0
  [3,16,1,0,.9239,.9239,0,.3827,1,0,0],
// 3 16 1 0 .9239 .7071 0 .7071 .9239 0 .3827
  [3,16,1,0,.9239,.7071,0,.7071,.9239,0,.3827],
// 3 16 1 0 .9239 .3827 0 .9239 .7071 0 .7071
  [3,16,1,0,.9239,.3827,0,.9239,.7071,0,.7071],
];
module ldraw_lib__3_16tndis(step=0, col=false, unit=2/5, alt=false, line=0.2, solid=!$preview)
    makepoly(ldraw_lib__3_16tndis(), step=step, col=col, unit=unit, alt=alt, line=line, solid=solid);
ldraw_lib__3_16tndis(line=0.2);
// file: ../p/1-4ndis.scad
use <../lib.scad>
function ldraw_lib__1_4ndis() = [
// 0 Disc Negative 0.25
// 0 Name: 1-4ndis.dat
// 0 Author: James Jessiman
// 0 !LDRAW_ORG Primitive UPDATE 2012-01
// 0 !LICENSE Licensed under CC BY 4.0 : see CAreadme.txt
// 
// 0 BFC CERTIFY CCW
  [0,"BFC","CERTIFY"],
  [0,"BFC","CCW"],
// 
// 0 !HISTORY 2002-03-23 [sbliss] Added BFC Statement
// 0 !HISTORY 2002-04-25 [PTadmin] Official Update 2002-02
// 0 !HISTORY 2007-06-22 [PTadmin] Header formatted for Contributor Agreement
// 0 !HISTORY 2008-07-01 [PTadmin] Official Update 2008-01
// 0 !HISTORY 2012-02-16 [Philo] Changed to CCW
// 0 !HISTORY 2012-03-30 [PTadmin] Official Update 2012-01
// 
// 
// 3 16 0.9239 0 0.3827 1 0 0 1 0 1
  [3,16,0.9239,0,0.3827,1,0,0,1,0,1],
// 3 16 0.7071 0 0.7071 0.9239 0 0.3827 1 0 1
  [3,16,0.7071,0,0.7071,0.9239,0,0.3827,1,0,1],
// 3 16 0.3827 0 0.9239 0.7071 0 0.7071 1 0 1
  [3,16,0.3827,0,0.9239,0.7071,0,0.7071,1,0,1],
// 3 16 0 0 1 0.3827 0 0.9239 1 0 1
  [3,16,0,0,1,0.3827,0,0.9239,1,0,1],
];
module ldraw_lib__1_4ndis(step=0, col=false, unit=2/5, alt=false, line=0.2, solid=!$preview)
    makepoly(ldraw_lib__1_4ndis(), step=step, col=col, unit=unit, alt=alt, line=line, solid=solid);
ldraw_lib__1_4ndis(line=0.2);
// file: ../p/1-16tndis.scad
use <../lib.scad>
function ldraw_lib__1_16tndis() = [
// 0 Disc Negative Truncated 0.0625
// 0 Name: 1-16tndis.dat
// 0 Author: Massimo Maso [Sirio]
// 0 !LDRAW_ORG Primitive UPDATE 2022-03
// 0 !LICENSE Licensed under CC BY 4.0 : see CAreadme.txt
// 
// 0 BFC CERTIFY CCW
  [0,"BFC","CERTIFY"],
  [0,"BFC","CCW"],
// 
// 0 !HISTORY 2022-05-07 [PTadmin] Official Update 2022-03
// 
// 
// 3 16 1 0 .3827 .9239 0 .3827 1 0 0
  [3,16,1,0,.3827,.9239,0,.3827,1,0,0],
];
module ldraw_lib__1_16tndis(step=0, col=false, unit=2/5, alt=false, line=0.2, solid=!$preview)
    makepoly(ldraw_lib__1_16tndis(), step=step, col=col, unit=unit, alt=alt, line=line, solid=solid);
ldraw_lib__1_16tndis(line=0.2);
// file: s/stickerback028x028a.scad
use <../../lib.scad>
use <../../p/4-4cyli.scad>
use <../../p/4-4ndis.scad>
use <../../p/48/1-4chrd.scad>
use <../../p/48/4-4cyli.scad>
function ldraw_lib__s__stickerback028x028a() = [
// 0 ~Sticker Back  2.8 x  2.8 Round with Center Cutout
// 0 Name: s\stickerback028x028a.dat
// 0 Author: Rene Rechthaler [Blechtaler]
// 0 !LDRAW_ORG Subpart UPDATE 2026-05
// 0 !LICENSE Licensed under CC BY 4.0 : see CAreadme.txt
// 
// 0 BFC CERTIFY CCW
  [0,"BFC","CERTIFY"],
  [0,"BFC","CCW"],
// 
// 0 !HISTORY 2026-05-31 [OrionP] Official Update 2026-05
// 
// 1 16 0 0 0 10 0 0 0 -1 0 0 0 10 4-4ndis.dat
  [1,16,0,0,0,10,0,0,0,-1,0,0,0,10, ldraw_lib__4_4ndis()],
// 0 BFC INVERTNEXT
  [0,"BFC","INVERTNEXT"],
// 1 16 0 0 0 10 0 0 0 -.25 0 0 0 10 4-4cyli.dat
  [1,16,0,0,0,10,0,0,0,-.25,0,0,0,10, ldraw_lib__4_4cyli()],
// 1 16 0 0 0 28 0 0 0 -.25 0 0 0 28 48\4-4cyli.dat
  [1,16,0,0,0,28,0,0,0,-.25,0,0,0,28, ldraw_lib__48__4_4cyli()],
// 1 16 0 0 0 28 0 0 0 -1 0 0 0 28 48\1-4chrd.dat
  [1,16,0,0,0,28,0,0,0,-1,0,0,0,28, ldraw_lib__48__1_4chrd()],
// 1 16 0 0 0 28 0 0 0 -1 0 0 0 -28 48\1-4chrd.dat
  [1,16,0,0,0,28,0,0,0,-1,0,0,0,-28, ldraw_lib__48__1_4chrd()],
// 1 16 0 0 0 -28 0 0 0 -1 0 0 0 -28 48\1-4chrd.dat
  [1,16,0,0,0,-28,0,0,0,-1,0,0,0,-28, ldraw_lib__48__1_4chrd()],
// 1 16 0 0 0 -28 0 0 0 -1 0 0 0 28 48\1-4chrd.dat
  [1,16,0,0,0,-28,0,0,0,-1,0,0,0,28, ldraw_lib__48__1_4chrd()],
// 3 16 10 0 0 10 0 10 28 0 0
  [3,16,10,0,0,10,0,10,28,0,0],
// 3 16 28 0 0 10 0 10 0 0 28
  [3,16,28,0,0,10,0,10,0,0,28],
// 3 16 10 0 10 0 0 10 0 0 28
  [3,16,10,0,10,0,0,10,0,0,28],
// 3 16 0 0 28 0 0 10 -10 0 10
  [3,16,0,0,28,0,0,10,-10,0,10],
// 3 16 0 0 28 -10 0 10 -28 0 0
  [3,16,0,0,28,-10,0,10,-28,0,0],
// 3 16 -10 0 10 -10 0 0 -28 0 0
  [3,16,-10,0,10,-10,0,0,-28,0,0],
// 3 16 -28 0 0 -10 0 0 -10 0 -10
  [3,16,-28,0,0,-10,0,0,-10,0,-10],
// 3 16 -28 0 0 -10 0 -10 0 0 -28
  [3,16,-28,0,0,-10,0,-10,0,0,-28],
// 3 16 -10 0 -10 0 0 -10 0 0 -28
  [3,16,-10,0,-10,0,0,-10,0,0,-28],
// 3 16 0 0 -10 10 0 -10 0 0 -28
  [3,16,0,0,-10,10,0,-10,0,0,-28],
// 3 16 0 0 -28 10 0 -10 28 0 0
  [3,16,0,0,-28,10,0,-10,28,0,0],
// 3 16 10 0 -10 10 0 0 28 0 0
  [3,16,10,0,-10,10,0,0,28,0,0],
];
module ldraw_lib__s__stickerback028x028a(step=0, col=false, unit=2/5, alt=false, line=0.2, solid=!$preview)
    makepoly(ldraw_lib__s__stickerback028x028a(), step=step, col=col, unit=unit, alt=alt, line=line, solid=solid);
ldraw_lib__s__stickerback028x028a(line=0.2);
// main file
use <../lib.scad>
use <s/6234010hs01.scad>
use <s/stickerback028x028a.scad>
function ldraw_lib__6234010h() = [
// 0 Sticker  2.8 x  2.8 with Hole with  2 Yellow Segmented Arrows
// 0 Name: 6234010h.dat
// 0 Author: Evert-Jan Boer [ejboer]
// 0 !LDRAW_ORG Part UPDATE 2026-05
// 0 !LICENSE Licensed under CC BY 4.0 : see CAreadme.txt
// 
// 0 BFC CERTIFY CCW
  [0,"BFC","CERTIFY"],
  [0,"BFC","CCW"],
// 
// 0 !KEYWORDS BrickLink 10261stk01, Brickowl 1323428, Rebrickable 39356
// 0 !KEYWORDS Roller Coaster, set 10261
// 
// 0 !HISTORY 2024-03-23 [OrionP] Updated ring primitives
// 0 !HISTORY 2025-06-26 [Blechtaler] subfiled, used prims
// 0 !HISTORY 2026-03-28 [Blechtaler] used stickerback
// 0 !HISTORY 2026-05-31 [OrionP] Official Update 2026-05
// 
// 1 16 0 0 0 1 0 0 0 1 0 0 0 1 s\stickerback028x028a.dat
  [1,16,0,0,0,1,0,0,0,1,0,0,0,1, ldraw_lib__s__stickerback028x028a()],
// 1 16 0 -.25 0 1 0 0 0 1 0 0 0 1 s\6234010hs01.dat
  [1,16,0,-.25,0,1,0,0,0,1,0,0,0,1, ldraw_lib__s__6234010hs01()],
// 1 16 0 -.25 0 -1 0 0 0 1 0 0 0 -1 s\6234010hs01.dat
  [1,16,0,-.25,0,-1,0,0,0,1,0,0,0,-1, ldraw_lib__s__6234010hs01()],
];
module ldraw_lib__6234010h(step=0, col=false, unit=2/5, alt=false, line=0.2, solid=!$preview)
    makepoly(ldraw_lib__6234010h(), step=step, col=col, unit=unit, alt=alt, line=line, solid=solid);
ldraw_lib__6234010h(line=0.2);
